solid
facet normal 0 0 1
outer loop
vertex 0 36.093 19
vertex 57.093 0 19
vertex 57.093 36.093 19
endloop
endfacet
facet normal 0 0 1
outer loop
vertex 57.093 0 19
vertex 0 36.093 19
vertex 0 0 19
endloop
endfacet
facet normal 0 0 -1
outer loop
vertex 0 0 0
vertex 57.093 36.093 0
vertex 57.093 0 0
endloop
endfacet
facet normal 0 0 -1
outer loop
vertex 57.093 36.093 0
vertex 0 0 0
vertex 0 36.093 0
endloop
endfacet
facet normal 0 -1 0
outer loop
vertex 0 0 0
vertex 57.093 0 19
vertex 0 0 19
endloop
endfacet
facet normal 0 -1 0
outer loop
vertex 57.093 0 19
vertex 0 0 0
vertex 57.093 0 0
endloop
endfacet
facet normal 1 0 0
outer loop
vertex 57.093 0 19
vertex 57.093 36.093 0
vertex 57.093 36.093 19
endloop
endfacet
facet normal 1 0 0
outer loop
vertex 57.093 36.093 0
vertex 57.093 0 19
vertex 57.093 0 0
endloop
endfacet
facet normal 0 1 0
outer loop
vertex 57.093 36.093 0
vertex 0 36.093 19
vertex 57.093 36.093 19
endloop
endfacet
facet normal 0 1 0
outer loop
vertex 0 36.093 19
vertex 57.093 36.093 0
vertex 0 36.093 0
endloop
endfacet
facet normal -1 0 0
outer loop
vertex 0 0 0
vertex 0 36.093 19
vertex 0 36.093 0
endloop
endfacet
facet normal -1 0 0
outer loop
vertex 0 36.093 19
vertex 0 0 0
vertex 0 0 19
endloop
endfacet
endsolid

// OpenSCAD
cube([57.09336, 36.09336, 19]);
translate([1.207, 2.042, 0])
    linear_extrude(height = 23.56, convexity = 5)
        import(file = "vgauche.dxf", layer = "0");
